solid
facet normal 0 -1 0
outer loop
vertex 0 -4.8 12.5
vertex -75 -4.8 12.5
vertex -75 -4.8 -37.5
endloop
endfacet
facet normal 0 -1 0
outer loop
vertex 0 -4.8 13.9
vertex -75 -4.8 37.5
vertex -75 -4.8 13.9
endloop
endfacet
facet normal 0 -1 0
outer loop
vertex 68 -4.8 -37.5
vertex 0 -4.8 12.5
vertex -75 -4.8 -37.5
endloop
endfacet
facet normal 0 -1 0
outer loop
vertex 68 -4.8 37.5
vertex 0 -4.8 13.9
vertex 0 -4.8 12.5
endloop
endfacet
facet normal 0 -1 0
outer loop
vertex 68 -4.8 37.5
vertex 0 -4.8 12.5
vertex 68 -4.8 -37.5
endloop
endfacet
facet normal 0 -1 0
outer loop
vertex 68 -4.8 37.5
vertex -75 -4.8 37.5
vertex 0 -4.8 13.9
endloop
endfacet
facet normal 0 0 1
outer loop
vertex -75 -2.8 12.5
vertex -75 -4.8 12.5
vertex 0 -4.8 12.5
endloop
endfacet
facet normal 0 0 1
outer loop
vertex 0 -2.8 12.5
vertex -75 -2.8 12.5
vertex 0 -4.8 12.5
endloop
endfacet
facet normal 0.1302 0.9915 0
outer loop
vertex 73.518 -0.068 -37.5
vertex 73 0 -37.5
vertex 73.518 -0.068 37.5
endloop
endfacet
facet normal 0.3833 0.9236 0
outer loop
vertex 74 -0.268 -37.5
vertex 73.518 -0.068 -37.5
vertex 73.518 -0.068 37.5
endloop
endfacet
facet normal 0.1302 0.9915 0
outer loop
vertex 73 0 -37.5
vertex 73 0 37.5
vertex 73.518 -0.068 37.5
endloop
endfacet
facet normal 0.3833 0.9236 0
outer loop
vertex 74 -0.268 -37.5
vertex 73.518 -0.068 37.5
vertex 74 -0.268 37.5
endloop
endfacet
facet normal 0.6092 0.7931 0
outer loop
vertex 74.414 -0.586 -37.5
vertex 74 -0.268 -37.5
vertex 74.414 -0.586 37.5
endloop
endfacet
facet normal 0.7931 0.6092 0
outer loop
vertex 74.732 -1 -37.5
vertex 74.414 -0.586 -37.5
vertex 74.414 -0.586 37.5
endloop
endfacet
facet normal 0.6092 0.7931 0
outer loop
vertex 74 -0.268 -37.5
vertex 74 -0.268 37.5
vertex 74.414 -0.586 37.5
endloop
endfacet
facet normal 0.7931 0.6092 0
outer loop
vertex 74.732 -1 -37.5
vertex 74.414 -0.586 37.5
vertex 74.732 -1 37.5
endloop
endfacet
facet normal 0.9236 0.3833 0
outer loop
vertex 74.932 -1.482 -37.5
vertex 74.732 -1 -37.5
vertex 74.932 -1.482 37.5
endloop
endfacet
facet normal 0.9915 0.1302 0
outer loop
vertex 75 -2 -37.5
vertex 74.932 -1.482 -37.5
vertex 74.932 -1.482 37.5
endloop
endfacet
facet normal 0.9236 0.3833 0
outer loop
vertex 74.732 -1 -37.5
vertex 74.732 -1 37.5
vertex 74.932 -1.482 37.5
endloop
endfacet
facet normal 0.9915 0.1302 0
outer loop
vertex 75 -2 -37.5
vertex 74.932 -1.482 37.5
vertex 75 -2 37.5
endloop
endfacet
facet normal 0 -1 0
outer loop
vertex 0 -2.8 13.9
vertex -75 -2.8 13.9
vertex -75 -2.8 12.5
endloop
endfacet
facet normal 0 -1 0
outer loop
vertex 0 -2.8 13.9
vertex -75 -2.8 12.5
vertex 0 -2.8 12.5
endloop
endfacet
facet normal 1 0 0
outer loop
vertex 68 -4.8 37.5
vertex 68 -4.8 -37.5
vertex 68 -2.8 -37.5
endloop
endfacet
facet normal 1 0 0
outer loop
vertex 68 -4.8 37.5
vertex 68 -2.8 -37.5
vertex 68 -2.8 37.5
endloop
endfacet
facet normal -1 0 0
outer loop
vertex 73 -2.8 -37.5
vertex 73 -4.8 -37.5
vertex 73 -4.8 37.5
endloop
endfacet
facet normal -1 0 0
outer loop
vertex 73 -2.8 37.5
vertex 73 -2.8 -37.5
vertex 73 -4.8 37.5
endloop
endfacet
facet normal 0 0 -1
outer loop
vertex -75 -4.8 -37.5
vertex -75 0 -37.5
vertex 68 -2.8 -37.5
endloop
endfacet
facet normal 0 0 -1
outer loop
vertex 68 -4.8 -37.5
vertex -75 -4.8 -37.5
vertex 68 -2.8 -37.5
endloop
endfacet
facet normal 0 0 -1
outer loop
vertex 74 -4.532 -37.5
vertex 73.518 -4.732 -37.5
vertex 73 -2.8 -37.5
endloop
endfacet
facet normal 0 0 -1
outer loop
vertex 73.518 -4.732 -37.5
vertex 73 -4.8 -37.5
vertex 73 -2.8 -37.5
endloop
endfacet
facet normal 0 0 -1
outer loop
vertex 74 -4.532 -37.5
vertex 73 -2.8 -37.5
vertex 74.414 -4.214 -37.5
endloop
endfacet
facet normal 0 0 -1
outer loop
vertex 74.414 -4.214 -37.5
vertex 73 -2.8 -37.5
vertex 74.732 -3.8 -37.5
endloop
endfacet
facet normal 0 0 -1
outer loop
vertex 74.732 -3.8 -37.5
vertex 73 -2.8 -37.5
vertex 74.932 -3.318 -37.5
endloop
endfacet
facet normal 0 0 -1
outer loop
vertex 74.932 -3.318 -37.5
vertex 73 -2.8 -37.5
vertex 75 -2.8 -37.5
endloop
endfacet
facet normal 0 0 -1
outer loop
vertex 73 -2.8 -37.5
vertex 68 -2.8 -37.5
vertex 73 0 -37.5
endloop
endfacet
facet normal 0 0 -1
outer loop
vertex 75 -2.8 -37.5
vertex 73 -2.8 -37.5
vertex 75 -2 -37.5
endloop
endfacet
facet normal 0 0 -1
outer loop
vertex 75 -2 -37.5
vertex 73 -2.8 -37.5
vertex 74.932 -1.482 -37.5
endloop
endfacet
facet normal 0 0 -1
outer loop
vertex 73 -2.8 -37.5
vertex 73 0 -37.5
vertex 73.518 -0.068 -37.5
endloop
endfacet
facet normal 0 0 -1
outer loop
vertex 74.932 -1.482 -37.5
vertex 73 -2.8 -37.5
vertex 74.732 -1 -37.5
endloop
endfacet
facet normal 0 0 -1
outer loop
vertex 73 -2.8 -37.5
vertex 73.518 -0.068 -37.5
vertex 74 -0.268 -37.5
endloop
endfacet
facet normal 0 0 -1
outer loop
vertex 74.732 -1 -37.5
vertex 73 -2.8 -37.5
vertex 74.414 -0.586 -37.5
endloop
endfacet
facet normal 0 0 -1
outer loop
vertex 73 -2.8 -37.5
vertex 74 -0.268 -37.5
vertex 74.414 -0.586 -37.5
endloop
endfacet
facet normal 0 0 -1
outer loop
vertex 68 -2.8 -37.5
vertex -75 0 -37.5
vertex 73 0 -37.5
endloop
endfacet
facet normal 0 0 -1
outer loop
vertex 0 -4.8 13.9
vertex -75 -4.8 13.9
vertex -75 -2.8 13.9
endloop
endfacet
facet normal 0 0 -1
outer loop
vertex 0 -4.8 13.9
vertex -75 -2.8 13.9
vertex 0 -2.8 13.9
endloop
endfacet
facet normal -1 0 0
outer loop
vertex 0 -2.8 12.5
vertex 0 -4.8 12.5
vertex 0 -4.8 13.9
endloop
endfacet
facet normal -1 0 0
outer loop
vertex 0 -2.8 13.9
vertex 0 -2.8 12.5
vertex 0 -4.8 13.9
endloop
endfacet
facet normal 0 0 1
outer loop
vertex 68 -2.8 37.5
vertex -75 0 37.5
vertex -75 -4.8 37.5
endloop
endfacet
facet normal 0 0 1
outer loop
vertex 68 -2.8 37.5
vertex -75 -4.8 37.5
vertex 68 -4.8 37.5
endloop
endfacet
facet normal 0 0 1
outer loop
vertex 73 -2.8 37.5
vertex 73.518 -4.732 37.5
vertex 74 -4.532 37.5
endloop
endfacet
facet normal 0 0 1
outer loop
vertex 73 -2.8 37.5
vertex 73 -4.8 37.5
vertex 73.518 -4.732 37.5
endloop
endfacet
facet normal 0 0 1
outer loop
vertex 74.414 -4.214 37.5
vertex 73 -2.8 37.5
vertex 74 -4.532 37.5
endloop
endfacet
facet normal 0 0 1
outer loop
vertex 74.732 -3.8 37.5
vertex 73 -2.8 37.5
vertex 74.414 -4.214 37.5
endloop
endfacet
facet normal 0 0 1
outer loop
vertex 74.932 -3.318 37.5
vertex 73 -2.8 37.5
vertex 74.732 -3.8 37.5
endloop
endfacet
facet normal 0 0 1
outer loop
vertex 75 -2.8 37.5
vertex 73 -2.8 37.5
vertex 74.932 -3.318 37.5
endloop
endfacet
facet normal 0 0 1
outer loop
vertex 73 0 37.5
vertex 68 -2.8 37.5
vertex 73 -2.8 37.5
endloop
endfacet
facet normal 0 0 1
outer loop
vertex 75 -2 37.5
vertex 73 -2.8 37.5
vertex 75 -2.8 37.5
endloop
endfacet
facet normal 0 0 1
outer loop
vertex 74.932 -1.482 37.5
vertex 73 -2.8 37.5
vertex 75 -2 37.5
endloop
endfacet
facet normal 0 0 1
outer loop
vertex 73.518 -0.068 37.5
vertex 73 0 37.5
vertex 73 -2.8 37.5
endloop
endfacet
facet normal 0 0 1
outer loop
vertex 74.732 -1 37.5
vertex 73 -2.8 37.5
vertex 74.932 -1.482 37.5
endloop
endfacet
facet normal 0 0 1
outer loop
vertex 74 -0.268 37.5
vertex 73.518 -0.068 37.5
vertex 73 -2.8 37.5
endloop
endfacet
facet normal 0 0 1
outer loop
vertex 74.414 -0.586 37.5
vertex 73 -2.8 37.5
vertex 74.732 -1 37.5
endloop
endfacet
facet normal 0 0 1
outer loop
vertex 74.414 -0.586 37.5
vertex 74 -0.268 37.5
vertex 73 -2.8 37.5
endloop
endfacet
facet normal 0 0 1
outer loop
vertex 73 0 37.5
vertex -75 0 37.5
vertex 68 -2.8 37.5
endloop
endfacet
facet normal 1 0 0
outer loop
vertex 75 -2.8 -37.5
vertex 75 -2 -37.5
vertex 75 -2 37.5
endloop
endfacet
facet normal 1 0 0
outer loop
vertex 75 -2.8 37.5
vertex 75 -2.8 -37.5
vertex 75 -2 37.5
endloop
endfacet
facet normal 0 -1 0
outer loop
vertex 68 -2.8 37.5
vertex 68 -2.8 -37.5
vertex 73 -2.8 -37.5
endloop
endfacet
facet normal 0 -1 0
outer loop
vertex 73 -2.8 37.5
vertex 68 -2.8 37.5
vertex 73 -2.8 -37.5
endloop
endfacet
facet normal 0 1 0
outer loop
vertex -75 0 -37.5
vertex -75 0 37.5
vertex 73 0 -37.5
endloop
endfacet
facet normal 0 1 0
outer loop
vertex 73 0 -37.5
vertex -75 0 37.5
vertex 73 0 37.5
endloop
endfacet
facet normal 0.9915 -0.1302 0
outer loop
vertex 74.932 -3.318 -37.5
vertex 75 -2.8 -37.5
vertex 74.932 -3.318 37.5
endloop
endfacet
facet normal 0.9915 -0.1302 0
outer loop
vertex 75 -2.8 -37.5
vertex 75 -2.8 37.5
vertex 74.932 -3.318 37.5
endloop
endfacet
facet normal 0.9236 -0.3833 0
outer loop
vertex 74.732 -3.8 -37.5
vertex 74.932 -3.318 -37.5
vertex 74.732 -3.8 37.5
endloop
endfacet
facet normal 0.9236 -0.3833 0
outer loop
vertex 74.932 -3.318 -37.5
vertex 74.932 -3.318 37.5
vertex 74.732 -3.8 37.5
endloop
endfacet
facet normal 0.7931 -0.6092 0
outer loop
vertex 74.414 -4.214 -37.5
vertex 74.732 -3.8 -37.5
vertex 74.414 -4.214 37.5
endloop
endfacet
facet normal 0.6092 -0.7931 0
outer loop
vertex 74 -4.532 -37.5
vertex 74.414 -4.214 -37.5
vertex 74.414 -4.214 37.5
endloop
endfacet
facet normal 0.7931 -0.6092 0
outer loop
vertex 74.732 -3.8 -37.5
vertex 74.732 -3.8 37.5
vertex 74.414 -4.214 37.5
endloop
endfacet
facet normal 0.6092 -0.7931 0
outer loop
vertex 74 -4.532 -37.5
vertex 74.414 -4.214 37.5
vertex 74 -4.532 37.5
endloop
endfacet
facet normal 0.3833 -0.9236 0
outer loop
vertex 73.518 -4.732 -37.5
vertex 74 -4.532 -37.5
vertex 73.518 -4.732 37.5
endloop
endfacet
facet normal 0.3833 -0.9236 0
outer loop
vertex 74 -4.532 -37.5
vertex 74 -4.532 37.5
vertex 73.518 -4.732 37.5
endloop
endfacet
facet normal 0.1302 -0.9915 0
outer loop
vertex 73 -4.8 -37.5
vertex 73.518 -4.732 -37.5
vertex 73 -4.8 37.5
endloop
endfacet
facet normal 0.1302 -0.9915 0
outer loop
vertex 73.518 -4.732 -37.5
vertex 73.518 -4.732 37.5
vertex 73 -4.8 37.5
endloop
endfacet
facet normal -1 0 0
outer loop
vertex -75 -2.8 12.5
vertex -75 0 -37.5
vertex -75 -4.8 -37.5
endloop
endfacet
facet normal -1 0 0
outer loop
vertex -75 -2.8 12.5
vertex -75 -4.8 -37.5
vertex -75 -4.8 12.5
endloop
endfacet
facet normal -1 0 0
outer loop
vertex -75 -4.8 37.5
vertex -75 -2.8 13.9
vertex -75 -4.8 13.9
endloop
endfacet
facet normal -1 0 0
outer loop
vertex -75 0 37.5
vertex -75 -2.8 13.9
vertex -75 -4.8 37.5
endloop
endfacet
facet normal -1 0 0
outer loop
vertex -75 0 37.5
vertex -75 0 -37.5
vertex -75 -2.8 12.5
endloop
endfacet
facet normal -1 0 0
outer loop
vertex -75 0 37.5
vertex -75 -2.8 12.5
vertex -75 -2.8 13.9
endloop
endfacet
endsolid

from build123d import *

# Parameters (mm, degrees)
F0_W     = 150
F0_H     = 75
F1_DEPTH = 4.8
F2_W     = 5
F2_H     = 75
F2_W_2   = 75
F2_H_2   = 1.4
F3_DEPTH = 2
F4_R     = 1.99999


# Not quite as in the source:
# - a fillet or chamfer is up to 0.001 mm smaller than in the source, because OpenCascade refuses the exact size


with BuildPart() as f1:
    # F0 (on Front) → F1 (new body)
    with BuildSketch(Plane.XZ):
        Rectangle(F0_W, F0_H)
    extrude(amount=F1_DEPTH)

    # F2 (on face) → F3 (cut)
    with BuildSketch(Plane.XZ.offset(4.8)):
        with Locations((70.5, 0)):
            Rectangle(F2_W, F2_H)
        with Locations((-37.5, 13.2)):
            Rectangle(F2_W_2, F2_H_2)
    extrude(amount=-F3_DEPTH, mode=Mode.SUBTRACT)

    # F4 (radius 2 in the source; OpenCascade refuses exactly that, so slightly less here)
    f4_edges = [f1.edges().sort_by_distance(p)[0] for p in [
        (75, 0, 0),
        (75, -4.8, 0),
    ]]
    fillet(f4_edges, radius=F4_R)


solid = f1.part
